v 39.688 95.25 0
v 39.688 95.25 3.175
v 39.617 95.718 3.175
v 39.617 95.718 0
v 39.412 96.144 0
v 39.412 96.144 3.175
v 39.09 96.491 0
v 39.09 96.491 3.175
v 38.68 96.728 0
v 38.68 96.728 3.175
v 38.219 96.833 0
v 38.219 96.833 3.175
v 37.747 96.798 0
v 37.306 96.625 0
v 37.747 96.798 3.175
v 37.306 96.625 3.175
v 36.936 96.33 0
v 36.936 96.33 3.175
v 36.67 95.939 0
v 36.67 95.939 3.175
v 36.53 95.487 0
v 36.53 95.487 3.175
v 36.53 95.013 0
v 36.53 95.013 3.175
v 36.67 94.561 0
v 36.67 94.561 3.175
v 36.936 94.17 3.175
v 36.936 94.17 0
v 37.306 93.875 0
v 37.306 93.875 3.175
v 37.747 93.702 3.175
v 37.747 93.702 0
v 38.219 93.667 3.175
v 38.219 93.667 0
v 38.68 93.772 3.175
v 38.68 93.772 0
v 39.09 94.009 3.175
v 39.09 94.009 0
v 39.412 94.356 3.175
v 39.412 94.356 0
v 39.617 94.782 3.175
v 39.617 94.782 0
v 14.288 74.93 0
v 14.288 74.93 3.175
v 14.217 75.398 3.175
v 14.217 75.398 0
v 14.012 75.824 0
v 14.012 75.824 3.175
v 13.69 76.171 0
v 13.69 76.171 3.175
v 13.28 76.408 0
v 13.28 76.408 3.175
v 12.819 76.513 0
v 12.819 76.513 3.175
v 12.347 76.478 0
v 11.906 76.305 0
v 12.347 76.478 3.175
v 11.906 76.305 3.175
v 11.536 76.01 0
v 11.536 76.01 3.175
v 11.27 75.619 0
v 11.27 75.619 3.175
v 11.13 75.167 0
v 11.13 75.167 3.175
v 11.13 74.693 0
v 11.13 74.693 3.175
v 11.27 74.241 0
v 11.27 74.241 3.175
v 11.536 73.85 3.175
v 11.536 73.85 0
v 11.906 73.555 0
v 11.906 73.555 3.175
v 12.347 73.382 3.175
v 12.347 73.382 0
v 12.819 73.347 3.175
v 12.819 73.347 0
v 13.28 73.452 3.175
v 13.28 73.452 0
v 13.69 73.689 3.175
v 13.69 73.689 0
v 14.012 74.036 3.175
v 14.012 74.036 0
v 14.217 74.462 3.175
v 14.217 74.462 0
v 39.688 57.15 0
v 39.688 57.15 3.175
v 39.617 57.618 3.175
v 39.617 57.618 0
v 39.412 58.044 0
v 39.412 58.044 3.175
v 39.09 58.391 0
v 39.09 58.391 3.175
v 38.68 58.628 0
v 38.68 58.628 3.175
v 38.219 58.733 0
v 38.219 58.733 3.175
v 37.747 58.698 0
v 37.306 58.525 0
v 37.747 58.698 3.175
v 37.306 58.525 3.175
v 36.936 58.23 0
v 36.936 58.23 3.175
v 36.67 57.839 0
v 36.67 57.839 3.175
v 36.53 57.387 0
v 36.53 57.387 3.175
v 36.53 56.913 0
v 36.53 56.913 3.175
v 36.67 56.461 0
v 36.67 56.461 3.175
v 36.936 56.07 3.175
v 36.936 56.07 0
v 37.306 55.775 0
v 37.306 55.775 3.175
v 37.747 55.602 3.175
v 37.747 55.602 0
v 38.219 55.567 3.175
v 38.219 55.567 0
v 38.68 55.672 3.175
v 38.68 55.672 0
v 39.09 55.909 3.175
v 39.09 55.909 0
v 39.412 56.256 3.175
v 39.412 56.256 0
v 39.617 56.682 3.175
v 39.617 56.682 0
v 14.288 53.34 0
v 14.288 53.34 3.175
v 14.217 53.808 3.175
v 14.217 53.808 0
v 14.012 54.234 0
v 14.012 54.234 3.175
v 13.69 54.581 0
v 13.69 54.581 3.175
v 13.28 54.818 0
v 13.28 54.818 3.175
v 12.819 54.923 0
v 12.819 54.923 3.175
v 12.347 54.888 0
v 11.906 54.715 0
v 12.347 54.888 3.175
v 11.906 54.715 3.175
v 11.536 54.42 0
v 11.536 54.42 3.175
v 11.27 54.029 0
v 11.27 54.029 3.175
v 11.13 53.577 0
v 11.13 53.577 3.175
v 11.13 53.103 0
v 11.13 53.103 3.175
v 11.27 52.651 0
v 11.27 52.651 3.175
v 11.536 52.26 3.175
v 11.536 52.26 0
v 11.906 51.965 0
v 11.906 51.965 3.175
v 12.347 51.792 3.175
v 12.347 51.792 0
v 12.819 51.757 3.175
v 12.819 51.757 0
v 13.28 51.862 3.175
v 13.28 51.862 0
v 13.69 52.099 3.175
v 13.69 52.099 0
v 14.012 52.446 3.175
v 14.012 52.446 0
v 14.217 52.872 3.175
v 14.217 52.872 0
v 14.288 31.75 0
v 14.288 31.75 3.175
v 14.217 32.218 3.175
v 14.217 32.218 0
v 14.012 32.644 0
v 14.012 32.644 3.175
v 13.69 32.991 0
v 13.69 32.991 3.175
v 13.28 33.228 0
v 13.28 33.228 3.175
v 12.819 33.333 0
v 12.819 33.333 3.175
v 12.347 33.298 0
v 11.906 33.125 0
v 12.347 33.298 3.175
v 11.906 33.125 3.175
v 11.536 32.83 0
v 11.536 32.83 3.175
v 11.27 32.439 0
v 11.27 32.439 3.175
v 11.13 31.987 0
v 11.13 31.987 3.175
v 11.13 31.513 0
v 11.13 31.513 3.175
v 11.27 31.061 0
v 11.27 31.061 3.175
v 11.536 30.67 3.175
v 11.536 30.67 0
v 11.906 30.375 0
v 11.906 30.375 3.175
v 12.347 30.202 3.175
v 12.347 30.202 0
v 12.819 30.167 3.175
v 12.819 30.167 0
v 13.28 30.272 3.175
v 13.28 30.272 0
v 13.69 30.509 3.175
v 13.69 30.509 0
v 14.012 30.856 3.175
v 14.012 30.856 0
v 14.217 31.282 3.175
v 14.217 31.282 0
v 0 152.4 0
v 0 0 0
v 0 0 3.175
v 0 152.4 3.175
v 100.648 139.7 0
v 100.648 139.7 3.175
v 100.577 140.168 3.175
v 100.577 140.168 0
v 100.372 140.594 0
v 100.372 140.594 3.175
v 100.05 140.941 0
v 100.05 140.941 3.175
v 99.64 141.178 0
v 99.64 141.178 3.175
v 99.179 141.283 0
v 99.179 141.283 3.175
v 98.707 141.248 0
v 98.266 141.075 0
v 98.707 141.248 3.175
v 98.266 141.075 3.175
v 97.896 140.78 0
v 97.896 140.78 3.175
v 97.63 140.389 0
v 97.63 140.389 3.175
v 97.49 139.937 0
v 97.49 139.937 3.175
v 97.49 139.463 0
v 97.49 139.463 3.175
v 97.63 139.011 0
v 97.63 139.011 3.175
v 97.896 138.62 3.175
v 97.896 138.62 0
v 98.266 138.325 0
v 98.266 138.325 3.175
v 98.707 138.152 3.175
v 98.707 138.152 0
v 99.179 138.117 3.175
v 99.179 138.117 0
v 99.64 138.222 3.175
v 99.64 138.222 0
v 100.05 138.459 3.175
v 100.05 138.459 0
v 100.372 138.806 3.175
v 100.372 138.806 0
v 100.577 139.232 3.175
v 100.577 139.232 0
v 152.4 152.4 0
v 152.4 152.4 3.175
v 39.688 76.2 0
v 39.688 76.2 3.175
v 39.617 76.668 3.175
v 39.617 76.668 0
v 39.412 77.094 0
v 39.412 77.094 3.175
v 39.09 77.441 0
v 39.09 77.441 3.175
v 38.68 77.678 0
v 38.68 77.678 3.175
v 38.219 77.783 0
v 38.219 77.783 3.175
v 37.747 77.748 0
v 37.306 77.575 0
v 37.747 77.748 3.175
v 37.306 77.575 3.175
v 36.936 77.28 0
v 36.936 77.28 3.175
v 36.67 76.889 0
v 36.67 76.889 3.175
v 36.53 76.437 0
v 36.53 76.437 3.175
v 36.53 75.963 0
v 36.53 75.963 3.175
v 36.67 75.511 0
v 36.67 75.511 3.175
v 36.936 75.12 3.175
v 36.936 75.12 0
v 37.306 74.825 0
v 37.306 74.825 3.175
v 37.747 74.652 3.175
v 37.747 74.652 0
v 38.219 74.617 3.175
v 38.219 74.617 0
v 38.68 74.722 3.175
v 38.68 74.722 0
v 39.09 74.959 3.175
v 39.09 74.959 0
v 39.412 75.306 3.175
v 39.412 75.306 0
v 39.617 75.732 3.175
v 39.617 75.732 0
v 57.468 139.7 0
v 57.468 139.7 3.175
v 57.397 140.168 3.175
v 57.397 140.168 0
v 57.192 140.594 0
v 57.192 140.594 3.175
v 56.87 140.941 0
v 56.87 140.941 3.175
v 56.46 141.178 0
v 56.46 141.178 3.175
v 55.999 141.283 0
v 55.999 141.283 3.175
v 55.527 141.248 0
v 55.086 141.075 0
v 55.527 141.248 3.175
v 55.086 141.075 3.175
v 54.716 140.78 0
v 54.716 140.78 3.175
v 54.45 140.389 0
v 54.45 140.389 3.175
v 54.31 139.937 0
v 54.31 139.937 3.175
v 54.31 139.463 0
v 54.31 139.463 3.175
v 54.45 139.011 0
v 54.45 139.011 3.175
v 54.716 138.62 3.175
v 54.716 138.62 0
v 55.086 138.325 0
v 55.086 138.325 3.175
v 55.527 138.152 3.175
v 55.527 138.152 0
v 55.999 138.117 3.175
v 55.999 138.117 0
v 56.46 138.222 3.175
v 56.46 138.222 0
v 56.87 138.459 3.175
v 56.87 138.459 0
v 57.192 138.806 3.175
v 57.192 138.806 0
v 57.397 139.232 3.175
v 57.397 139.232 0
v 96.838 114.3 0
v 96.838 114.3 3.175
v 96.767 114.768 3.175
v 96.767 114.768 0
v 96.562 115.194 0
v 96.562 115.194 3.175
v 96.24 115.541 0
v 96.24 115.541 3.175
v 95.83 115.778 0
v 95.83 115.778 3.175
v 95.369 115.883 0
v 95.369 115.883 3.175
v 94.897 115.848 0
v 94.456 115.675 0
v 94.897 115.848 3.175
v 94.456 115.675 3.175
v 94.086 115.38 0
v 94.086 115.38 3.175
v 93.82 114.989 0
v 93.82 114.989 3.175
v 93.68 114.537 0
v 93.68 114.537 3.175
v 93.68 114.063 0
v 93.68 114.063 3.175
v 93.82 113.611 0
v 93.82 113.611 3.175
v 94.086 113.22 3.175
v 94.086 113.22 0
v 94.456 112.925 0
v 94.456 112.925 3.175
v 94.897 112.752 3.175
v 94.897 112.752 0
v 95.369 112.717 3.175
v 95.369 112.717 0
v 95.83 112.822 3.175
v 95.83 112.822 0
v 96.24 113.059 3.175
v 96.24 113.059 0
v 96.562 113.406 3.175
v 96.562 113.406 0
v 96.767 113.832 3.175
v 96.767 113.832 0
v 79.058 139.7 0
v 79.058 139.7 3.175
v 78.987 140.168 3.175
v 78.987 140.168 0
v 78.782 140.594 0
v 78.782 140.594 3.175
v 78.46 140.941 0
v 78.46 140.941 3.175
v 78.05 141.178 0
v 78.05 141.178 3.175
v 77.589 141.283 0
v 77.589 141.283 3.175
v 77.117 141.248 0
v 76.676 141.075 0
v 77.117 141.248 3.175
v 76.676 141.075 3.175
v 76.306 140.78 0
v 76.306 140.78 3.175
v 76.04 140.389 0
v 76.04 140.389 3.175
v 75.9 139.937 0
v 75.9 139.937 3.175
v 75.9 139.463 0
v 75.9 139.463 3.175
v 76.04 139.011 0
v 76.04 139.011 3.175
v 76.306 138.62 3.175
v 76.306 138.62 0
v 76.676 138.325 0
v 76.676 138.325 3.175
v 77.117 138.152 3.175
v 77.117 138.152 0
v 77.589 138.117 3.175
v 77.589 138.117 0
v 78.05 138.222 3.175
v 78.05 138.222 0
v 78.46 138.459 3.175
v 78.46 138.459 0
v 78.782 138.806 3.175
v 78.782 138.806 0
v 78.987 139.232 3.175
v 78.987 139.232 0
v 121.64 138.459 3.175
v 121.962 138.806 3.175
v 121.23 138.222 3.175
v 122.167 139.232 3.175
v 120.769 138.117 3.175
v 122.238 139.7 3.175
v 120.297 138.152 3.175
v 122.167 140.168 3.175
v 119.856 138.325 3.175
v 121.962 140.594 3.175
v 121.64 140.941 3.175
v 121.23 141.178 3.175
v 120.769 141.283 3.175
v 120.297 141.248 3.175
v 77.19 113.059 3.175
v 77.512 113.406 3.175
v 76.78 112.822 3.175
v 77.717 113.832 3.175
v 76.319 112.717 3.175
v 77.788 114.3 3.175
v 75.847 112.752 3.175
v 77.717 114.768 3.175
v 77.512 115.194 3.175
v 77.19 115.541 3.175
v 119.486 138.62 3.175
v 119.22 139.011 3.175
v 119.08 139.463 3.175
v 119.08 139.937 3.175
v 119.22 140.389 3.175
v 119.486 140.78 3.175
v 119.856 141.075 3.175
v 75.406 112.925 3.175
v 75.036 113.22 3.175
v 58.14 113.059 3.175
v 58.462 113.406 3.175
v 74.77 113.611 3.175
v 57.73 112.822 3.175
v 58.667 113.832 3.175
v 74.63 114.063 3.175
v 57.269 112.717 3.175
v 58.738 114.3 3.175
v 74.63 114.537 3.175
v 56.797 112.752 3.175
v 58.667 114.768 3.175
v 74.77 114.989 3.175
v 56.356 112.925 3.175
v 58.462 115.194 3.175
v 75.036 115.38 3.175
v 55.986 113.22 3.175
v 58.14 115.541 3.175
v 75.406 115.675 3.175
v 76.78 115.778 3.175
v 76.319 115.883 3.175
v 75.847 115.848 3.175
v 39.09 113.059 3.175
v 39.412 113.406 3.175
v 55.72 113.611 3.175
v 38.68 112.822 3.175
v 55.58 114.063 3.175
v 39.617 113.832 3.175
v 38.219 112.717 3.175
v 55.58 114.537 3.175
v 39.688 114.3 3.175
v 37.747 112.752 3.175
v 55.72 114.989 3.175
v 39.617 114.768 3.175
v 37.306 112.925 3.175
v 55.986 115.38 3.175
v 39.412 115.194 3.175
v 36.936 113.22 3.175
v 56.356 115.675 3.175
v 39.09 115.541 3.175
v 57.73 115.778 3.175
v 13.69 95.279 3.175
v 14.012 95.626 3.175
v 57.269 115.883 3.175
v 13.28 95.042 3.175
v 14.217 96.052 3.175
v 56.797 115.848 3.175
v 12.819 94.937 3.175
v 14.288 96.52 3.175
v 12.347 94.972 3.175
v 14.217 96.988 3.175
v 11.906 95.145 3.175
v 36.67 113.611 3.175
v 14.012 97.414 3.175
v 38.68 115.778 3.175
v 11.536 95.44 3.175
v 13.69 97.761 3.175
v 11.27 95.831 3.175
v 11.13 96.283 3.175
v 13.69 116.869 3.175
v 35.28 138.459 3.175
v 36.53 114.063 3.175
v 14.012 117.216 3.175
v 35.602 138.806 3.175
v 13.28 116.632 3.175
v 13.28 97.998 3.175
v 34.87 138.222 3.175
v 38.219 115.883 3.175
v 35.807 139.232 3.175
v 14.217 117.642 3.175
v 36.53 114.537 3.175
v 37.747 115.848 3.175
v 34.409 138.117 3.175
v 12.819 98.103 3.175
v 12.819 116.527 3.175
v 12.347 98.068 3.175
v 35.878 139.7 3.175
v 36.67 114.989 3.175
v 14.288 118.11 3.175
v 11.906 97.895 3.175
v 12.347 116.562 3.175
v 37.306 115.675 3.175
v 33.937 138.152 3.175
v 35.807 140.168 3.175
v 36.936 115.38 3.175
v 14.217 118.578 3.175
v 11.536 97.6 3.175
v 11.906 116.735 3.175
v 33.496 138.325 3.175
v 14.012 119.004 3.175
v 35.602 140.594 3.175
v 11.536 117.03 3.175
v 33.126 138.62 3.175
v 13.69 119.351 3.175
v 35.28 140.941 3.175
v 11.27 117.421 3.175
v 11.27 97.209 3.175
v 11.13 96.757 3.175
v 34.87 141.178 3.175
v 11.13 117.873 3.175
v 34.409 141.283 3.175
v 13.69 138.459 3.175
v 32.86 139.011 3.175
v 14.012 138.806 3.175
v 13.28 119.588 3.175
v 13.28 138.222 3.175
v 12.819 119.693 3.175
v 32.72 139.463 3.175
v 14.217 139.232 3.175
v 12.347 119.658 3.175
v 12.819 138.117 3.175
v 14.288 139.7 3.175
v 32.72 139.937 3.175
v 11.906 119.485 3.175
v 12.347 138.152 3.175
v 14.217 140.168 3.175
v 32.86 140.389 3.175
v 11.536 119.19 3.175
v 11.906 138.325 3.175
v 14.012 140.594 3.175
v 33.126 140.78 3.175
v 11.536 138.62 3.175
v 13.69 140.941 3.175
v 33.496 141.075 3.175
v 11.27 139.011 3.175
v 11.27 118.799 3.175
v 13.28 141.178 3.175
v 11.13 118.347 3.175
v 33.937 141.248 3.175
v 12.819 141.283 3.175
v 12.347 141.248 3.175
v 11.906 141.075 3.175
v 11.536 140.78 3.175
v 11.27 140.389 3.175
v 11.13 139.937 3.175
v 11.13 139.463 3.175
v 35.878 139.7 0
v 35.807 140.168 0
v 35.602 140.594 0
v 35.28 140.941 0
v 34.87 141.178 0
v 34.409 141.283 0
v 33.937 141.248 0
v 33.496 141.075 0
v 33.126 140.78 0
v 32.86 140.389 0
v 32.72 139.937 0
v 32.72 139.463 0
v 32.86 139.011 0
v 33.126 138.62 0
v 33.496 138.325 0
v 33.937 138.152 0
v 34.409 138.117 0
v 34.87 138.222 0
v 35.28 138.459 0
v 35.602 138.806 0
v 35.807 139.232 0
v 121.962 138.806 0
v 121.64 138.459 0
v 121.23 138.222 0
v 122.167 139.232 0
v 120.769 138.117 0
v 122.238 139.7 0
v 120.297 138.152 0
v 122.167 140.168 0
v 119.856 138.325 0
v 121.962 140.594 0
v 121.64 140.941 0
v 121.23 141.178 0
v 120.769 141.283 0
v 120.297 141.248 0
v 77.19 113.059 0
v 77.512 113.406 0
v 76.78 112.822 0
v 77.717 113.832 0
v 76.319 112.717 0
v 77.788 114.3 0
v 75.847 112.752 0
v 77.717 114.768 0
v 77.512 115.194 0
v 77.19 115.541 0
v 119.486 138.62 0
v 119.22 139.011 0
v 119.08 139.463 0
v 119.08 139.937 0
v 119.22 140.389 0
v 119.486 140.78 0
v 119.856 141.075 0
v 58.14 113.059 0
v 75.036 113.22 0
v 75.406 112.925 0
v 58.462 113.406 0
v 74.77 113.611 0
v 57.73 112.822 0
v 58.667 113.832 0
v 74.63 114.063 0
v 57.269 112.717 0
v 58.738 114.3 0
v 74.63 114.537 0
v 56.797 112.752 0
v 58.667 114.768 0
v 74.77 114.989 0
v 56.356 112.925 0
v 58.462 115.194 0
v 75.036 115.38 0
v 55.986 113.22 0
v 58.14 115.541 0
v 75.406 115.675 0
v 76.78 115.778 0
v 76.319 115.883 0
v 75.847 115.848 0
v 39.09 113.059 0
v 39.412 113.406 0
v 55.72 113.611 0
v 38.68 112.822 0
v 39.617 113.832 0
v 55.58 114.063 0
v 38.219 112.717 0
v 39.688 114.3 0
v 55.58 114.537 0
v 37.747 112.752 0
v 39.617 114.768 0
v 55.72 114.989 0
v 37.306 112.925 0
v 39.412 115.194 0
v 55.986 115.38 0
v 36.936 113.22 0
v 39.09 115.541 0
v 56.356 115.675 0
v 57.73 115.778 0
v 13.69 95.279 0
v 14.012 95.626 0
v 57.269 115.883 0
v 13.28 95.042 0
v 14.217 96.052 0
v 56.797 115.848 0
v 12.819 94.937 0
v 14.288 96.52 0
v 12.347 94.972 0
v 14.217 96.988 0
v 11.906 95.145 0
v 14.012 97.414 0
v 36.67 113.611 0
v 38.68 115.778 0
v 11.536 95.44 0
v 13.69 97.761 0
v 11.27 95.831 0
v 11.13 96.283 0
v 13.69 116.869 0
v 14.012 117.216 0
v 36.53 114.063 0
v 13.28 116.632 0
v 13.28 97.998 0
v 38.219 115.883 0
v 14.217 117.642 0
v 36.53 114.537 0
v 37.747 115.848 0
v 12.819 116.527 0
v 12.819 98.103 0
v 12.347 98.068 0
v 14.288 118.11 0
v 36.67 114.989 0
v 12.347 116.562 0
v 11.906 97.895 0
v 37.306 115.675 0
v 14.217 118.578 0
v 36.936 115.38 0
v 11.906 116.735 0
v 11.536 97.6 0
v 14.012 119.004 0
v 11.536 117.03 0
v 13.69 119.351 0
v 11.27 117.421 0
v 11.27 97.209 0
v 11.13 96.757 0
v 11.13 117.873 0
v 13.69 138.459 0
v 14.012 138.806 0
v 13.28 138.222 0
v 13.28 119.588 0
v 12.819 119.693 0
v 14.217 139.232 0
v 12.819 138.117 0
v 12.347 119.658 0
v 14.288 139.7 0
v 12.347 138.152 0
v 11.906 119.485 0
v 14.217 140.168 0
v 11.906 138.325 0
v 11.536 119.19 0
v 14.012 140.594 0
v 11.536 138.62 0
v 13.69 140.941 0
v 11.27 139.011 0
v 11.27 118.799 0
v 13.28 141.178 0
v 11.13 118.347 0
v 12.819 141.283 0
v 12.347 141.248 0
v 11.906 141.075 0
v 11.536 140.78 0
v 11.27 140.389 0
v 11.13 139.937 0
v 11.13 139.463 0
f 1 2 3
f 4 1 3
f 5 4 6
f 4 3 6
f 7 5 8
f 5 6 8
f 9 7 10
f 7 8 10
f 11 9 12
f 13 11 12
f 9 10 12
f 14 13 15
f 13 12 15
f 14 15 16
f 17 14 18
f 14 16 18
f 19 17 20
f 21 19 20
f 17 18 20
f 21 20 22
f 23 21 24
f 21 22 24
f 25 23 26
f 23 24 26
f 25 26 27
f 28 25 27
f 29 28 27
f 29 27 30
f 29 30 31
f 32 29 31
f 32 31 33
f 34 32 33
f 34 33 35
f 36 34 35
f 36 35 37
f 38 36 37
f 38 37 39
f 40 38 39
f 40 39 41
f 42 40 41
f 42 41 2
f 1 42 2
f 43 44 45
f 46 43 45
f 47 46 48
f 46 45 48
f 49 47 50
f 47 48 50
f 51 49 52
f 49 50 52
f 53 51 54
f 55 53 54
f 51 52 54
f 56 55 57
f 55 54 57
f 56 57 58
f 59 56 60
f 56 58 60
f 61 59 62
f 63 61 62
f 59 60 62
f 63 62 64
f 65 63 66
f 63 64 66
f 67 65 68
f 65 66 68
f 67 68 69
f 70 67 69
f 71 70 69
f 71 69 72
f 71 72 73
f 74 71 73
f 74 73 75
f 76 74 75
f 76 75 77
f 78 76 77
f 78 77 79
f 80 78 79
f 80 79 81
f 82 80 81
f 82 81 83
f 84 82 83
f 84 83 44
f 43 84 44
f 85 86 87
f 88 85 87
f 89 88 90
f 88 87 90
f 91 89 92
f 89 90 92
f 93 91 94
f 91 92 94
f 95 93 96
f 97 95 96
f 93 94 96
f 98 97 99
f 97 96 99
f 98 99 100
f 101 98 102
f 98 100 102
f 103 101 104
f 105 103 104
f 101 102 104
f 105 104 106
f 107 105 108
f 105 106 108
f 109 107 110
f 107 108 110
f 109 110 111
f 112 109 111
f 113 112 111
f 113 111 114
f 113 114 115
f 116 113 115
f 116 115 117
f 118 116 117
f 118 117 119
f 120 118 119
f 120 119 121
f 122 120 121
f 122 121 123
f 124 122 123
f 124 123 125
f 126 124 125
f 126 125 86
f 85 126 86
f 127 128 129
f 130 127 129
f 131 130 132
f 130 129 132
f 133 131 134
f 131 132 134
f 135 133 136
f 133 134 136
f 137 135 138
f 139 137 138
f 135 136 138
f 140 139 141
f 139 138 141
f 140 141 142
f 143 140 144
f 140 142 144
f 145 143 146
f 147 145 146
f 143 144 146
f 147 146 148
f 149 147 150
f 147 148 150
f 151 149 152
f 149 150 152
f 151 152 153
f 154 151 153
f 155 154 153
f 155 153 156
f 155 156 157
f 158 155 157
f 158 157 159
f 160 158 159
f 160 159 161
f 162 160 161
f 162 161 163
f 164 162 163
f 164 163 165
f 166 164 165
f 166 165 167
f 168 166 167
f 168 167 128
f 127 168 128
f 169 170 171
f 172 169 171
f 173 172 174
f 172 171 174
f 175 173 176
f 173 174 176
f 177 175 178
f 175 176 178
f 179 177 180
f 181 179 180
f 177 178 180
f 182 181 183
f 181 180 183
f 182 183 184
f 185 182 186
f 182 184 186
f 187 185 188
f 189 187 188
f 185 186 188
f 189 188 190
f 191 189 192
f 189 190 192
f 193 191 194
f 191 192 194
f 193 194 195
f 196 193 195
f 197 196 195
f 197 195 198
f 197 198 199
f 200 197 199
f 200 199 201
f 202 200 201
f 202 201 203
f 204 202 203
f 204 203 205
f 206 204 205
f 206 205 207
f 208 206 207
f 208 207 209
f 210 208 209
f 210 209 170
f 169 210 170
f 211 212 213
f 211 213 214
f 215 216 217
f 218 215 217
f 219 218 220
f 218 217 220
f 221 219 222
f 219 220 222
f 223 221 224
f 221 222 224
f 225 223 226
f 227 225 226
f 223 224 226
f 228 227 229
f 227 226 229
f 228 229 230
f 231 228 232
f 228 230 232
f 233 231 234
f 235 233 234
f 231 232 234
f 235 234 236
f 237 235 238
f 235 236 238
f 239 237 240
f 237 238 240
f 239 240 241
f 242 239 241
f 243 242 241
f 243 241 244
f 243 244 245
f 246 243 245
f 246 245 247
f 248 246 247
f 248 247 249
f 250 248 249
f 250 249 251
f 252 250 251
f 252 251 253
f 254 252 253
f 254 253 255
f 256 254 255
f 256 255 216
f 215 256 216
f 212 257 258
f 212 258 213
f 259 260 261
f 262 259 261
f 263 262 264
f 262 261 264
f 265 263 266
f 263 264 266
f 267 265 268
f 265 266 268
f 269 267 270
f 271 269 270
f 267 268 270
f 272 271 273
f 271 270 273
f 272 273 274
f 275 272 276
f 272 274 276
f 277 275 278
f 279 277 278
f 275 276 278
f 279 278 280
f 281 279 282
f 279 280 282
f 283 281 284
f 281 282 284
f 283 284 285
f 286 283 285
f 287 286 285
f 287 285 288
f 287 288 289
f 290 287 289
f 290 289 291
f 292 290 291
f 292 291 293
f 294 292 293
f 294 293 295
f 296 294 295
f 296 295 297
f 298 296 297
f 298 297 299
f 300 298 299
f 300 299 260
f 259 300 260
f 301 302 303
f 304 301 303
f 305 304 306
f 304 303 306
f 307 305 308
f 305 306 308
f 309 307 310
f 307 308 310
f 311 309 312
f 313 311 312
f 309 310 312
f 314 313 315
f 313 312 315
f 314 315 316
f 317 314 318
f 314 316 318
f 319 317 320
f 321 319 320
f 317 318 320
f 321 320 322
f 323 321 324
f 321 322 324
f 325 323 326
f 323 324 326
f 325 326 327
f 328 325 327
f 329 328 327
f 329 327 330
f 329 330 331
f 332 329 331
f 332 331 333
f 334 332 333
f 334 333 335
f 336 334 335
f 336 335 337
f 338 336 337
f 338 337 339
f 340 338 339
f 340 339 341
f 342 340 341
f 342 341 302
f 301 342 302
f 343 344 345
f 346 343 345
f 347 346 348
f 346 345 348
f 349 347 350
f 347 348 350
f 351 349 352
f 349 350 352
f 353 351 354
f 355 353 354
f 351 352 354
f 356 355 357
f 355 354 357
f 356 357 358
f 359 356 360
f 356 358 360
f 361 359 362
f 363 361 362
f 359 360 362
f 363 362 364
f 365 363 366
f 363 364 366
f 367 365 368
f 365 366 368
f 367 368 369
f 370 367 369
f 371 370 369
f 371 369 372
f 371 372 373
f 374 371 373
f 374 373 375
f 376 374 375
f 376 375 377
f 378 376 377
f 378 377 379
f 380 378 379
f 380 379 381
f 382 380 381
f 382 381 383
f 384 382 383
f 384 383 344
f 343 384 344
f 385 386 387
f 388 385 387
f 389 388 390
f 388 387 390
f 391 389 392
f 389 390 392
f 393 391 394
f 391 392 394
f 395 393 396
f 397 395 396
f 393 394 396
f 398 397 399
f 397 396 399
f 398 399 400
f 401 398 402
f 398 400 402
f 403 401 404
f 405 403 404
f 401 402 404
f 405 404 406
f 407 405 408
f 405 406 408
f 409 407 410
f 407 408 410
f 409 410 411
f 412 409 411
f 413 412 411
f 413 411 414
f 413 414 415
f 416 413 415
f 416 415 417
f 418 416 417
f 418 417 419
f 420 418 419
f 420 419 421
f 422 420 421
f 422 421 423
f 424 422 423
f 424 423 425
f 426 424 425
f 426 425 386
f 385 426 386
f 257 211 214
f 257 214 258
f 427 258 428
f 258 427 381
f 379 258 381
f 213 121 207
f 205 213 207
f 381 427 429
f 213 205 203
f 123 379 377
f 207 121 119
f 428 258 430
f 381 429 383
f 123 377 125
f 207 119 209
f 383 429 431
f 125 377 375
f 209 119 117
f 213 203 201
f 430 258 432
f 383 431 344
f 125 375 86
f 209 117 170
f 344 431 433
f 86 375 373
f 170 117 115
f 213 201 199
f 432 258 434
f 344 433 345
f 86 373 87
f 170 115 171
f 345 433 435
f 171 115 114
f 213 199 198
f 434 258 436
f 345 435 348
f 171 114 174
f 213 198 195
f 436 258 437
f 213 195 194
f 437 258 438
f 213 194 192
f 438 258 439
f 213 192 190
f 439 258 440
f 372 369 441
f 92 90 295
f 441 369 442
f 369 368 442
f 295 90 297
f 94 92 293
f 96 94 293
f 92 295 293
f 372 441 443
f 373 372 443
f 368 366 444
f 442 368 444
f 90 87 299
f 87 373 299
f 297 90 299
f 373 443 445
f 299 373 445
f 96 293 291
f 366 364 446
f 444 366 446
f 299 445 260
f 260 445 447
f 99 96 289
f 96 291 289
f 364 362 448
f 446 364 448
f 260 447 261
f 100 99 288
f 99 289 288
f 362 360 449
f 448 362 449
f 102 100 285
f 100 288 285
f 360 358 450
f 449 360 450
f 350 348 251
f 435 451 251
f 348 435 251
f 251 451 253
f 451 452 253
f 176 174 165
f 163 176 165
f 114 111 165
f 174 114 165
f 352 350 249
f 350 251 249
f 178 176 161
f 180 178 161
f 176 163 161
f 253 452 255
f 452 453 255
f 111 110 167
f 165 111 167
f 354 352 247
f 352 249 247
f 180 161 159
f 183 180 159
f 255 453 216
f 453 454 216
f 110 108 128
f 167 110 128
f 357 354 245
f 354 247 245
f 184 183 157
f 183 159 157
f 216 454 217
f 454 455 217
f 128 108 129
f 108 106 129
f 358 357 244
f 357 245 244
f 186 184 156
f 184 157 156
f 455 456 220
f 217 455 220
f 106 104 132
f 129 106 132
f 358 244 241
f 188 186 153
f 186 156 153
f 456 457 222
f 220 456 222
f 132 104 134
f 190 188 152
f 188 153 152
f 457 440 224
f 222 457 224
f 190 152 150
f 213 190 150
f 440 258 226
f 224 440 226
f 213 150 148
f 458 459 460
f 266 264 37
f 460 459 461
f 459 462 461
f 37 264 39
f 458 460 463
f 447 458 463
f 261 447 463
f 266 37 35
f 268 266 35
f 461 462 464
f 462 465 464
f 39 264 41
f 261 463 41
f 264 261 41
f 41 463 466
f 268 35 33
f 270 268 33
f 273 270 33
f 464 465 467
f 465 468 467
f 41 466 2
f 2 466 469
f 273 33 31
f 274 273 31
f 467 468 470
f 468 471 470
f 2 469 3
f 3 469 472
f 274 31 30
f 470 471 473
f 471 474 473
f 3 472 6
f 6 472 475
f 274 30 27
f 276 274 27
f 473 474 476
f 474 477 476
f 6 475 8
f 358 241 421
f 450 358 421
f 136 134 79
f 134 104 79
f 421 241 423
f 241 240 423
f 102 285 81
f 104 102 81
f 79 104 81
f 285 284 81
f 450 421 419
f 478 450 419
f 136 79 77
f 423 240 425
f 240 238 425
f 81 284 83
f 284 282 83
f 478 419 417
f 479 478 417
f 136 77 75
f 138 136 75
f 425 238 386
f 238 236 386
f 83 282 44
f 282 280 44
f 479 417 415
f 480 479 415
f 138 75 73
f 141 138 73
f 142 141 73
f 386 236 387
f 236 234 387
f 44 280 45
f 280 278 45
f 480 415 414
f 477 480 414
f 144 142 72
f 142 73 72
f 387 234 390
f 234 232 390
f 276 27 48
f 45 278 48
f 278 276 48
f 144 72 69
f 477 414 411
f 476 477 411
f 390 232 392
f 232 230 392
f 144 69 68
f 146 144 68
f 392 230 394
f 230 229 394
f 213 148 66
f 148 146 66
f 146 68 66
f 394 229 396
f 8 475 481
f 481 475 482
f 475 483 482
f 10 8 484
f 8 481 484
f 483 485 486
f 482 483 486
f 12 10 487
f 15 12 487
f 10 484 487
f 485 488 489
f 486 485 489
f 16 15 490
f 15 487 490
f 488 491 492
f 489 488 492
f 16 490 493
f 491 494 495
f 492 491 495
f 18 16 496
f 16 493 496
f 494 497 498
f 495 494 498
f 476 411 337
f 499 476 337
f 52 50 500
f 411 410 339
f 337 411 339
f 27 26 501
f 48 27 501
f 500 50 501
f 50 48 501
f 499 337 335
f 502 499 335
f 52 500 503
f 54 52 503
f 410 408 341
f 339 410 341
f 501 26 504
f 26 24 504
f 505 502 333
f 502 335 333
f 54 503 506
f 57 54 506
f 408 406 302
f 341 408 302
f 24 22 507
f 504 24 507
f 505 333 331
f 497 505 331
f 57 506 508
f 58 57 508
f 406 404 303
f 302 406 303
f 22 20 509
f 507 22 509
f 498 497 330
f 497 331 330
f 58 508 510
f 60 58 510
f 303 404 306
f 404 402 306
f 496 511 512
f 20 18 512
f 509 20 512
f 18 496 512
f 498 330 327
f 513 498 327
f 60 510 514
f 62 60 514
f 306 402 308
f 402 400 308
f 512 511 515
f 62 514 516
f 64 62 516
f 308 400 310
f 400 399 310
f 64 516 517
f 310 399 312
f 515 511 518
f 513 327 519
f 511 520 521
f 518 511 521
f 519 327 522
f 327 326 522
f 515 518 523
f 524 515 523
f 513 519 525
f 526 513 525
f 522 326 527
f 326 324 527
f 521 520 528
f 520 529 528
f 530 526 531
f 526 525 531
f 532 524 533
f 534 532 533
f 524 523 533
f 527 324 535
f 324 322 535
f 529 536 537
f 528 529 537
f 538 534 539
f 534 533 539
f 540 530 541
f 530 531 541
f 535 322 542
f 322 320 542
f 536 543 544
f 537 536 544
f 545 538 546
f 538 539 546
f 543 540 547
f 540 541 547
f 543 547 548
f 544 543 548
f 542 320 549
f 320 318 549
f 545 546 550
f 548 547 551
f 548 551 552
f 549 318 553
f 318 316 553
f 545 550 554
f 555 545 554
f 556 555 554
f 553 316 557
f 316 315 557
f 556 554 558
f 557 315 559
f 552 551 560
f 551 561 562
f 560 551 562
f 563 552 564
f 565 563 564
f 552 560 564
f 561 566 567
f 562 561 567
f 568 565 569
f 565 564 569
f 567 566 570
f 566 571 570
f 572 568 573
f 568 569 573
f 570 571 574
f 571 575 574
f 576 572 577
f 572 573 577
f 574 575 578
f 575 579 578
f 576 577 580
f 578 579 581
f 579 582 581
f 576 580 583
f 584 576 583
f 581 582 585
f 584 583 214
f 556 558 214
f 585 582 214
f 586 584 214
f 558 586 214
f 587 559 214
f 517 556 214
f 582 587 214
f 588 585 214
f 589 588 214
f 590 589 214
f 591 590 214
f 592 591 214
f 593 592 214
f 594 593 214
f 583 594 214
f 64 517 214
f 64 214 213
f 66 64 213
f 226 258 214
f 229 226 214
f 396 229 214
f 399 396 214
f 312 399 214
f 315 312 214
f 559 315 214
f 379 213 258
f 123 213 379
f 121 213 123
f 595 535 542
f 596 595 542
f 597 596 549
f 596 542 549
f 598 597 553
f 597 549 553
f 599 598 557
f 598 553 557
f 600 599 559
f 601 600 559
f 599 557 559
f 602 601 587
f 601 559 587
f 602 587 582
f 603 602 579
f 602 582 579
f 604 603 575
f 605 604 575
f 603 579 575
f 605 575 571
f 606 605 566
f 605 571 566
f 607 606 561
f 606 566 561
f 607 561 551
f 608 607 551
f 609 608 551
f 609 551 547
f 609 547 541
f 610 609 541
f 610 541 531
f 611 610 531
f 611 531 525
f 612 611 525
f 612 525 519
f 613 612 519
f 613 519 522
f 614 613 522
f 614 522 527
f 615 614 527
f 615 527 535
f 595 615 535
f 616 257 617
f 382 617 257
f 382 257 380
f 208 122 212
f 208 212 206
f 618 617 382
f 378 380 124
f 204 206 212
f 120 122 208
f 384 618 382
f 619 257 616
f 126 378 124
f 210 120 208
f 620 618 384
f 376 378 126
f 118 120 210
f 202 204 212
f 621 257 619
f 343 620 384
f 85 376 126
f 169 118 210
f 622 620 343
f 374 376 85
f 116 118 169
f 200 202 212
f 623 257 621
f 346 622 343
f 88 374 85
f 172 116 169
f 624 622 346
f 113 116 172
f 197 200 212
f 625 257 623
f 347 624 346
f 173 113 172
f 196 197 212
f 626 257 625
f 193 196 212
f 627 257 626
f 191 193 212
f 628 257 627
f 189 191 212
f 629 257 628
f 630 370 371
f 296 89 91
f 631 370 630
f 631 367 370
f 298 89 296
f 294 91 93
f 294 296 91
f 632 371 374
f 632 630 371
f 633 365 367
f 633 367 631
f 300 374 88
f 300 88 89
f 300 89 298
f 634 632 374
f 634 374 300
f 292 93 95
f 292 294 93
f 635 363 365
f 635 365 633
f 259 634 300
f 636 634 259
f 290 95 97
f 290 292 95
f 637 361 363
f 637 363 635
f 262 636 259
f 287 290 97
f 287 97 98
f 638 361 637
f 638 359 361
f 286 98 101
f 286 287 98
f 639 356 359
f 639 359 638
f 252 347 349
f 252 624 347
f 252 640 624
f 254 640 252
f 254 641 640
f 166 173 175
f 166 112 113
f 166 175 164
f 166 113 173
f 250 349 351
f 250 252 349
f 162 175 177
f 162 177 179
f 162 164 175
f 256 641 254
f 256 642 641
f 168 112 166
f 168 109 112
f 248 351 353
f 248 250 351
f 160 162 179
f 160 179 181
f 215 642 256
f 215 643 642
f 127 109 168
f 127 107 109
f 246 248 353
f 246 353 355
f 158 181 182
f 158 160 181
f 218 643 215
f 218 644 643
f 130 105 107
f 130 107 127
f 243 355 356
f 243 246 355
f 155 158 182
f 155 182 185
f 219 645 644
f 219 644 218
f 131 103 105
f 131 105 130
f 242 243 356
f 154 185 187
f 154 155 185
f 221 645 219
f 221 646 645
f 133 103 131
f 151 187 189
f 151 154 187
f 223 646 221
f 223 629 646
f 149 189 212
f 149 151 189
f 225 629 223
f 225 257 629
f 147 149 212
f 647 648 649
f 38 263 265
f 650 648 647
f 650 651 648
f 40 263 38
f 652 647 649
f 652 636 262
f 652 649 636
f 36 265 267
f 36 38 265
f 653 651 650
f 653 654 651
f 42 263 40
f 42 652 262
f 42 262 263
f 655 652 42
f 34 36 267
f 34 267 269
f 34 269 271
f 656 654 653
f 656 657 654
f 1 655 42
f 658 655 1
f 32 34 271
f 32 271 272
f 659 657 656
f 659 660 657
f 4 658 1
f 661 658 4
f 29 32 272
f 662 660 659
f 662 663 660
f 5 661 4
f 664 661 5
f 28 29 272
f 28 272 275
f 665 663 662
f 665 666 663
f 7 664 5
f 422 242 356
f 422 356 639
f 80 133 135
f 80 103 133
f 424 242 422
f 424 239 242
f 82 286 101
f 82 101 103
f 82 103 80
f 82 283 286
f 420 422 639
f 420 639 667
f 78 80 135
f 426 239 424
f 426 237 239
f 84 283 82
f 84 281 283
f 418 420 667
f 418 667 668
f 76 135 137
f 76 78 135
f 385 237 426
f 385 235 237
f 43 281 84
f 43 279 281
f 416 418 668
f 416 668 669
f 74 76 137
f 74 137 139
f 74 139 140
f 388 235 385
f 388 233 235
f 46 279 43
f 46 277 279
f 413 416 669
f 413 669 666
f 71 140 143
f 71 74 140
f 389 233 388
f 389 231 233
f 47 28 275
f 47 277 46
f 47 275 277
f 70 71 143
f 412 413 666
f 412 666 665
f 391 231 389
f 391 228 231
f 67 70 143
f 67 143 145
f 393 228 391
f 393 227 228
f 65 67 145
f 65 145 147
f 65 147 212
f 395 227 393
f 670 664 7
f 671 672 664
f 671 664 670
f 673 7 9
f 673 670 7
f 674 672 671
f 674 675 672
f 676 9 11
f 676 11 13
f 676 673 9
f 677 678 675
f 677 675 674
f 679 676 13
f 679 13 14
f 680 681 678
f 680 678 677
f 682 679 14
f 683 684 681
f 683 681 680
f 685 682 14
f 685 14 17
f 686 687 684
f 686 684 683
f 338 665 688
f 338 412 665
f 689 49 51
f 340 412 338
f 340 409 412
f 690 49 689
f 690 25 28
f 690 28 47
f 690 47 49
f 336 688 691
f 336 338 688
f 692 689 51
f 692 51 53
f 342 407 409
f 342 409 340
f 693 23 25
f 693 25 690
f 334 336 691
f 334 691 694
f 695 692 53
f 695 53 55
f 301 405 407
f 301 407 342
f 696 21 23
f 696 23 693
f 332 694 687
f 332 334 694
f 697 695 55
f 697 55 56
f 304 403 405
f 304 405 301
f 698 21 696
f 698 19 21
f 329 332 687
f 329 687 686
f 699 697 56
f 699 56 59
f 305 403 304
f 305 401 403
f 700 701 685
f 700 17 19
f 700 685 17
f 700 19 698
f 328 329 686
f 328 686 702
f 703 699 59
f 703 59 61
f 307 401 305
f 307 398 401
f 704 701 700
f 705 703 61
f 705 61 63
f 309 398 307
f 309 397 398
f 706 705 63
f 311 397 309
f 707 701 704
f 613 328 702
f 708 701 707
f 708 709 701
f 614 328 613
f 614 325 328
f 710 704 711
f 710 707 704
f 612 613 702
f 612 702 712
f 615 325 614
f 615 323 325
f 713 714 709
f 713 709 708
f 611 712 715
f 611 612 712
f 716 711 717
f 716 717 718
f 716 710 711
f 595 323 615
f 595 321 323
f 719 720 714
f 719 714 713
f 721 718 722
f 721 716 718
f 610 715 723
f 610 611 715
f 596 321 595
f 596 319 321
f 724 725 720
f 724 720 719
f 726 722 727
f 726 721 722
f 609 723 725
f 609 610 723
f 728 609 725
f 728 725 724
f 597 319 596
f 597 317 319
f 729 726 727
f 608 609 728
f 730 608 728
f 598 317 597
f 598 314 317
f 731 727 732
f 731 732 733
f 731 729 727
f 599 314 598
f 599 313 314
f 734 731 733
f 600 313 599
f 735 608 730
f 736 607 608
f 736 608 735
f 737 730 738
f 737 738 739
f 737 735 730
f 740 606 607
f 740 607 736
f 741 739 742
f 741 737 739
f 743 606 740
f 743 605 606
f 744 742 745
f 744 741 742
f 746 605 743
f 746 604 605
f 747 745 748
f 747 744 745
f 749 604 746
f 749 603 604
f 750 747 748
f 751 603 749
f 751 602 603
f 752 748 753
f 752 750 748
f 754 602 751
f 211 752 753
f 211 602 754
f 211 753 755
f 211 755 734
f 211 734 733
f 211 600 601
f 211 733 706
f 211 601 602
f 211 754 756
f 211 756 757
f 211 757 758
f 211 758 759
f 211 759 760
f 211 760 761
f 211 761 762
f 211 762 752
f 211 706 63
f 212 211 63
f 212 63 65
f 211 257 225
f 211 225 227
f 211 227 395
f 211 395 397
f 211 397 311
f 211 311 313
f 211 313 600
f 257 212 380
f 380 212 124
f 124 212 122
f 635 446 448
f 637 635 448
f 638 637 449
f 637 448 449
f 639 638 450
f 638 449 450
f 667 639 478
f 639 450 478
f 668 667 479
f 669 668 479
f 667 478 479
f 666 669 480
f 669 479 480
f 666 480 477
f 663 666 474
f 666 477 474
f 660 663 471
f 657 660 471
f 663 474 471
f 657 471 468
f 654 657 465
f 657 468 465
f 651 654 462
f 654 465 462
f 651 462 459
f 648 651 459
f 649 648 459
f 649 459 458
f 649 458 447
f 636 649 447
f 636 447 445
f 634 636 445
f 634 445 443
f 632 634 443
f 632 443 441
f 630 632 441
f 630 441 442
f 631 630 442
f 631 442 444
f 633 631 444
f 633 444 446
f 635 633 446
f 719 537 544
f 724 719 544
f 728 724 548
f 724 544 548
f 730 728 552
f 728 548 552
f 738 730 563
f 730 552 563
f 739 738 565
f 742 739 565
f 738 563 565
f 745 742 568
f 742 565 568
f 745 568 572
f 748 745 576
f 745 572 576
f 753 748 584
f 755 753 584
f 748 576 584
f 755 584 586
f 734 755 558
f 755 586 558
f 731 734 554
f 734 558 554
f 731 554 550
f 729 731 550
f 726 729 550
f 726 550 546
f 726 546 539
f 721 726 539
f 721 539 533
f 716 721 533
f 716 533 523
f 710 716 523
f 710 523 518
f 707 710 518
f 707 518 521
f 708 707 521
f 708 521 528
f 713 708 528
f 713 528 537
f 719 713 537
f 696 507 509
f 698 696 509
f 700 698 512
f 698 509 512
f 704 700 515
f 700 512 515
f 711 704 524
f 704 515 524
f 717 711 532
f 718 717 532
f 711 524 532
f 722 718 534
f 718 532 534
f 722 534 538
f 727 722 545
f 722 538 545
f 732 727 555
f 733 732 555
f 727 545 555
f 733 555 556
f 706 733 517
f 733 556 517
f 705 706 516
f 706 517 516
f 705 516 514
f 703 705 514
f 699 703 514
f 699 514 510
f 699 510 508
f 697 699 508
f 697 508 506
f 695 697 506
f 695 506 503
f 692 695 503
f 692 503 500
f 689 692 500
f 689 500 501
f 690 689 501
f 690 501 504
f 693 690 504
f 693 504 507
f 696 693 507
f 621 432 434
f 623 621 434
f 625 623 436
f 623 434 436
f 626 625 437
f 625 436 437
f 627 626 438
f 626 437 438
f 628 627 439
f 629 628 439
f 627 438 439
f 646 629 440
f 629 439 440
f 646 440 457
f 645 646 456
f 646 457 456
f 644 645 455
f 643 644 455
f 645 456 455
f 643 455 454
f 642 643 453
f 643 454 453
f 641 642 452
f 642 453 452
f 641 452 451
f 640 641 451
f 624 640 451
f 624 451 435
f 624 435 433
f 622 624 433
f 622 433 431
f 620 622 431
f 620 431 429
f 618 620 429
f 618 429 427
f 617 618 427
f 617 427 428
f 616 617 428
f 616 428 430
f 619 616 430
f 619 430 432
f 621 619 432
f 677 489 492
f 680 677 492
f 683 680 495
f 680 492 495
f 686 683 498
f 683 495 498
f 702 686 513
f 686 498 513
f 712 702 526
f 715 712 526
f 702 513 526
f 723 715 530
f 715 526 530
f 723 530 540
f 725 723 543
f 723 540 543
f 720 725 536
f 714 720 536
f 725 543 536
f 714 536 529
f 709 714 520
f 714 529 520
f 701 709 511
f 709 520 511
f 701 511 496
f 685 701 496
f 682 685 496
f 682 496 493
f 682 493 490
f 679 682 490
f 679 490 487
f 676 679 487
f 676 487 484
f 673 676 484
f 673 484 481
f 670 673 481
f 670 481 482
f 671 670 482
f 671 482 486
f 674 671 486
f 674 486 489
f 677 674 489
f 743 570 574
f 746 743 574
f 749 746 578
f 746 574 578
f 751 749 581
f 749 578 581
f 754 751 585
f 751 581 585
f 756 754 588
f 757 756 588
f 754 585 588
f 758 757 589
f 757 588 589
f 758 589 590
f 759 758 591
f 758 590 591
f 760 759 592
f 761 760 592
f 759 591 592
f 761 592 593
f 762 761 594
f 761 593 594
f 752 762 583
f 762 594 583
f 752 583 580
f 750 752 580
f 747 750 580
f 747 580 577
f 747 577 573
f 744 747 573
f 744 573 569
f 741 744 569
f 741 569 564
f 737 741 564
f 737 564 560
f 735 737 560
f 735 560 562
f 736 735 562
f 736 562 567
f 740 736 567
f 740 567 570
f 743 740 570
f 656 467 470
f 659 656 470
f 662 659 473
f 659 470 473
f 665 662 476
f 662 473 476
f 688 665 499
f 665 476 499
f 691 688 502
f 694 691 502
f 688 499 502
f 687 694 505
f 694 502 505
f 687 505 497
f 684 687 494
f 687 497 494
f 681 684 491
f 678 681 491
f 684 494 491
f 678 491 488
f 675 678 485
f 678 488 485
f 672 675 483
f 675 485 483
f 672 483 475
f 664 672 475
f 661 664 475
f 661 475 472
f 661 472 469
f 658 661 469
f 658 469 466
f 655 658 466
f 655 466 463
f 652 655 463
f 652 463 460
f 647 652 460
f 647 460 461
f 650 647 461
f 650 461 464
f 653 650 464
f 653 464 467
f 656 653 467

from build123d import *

# Parameters (mm, degrees)
BOSS_EXTRUDE1_DEPTH = 3.175
SKETCH2_R           = 1.5875
CUT_EXTRUDE_R_DEPTH = 216.549531721


with BuildPart() as part:
    # Sketch1 → Boss-Extrude1 (new body)
    with BuildSketch(Plane.XY):
        Polygon((0, 0), (0, 152.4), (152.4, 152.4), align=None)
    extrude(amount=BOSS_EXTRUDE1_DEPTH)

    # Sketch2 → Cut-Extrude r (cut, through all)
    with BuildSketch(Plane.XY.offset(3.175)):
        with Locations((12.7, 139.7)):
            Circle(SKETCH2_R)
        with Locations((34.29, 139.7)):
            Circle(SKETCH2_R)
        with Locations((55.88, 139.7)):
            Circle(SKETCH2_R)
        with Locations((77.47, 139.7)):
            Circle(SKETCH2_R)
        with Locations((12.7, 118.11)):
            Circle(SKETCH2_R)
        with Locations((12.7, 96.52)):
            Circle(SKETCH2_R)
        with Locations((12.7, 74.93)):
            Circle(SKETCH2_R)
        with Locations((38.1, 114.3)):
            Circle(SKETCH2_R)
        with Locations((57.15, 114.3)):
            Circle(SKETCH2_R)
        with Locations((38.1, 95.25)):
            Circle(SKETCH2_R)
        with Locations((99.06, 139.7)):
            Circle(SKETCH2_R)
        with Locations((120.65, 139.7)):
            Circle(SKETCH2_R)
        with Locations((12.7, 53.34)):
            Circle(SKETCH2_R)
        with Locations((12.7, 31.75)):
            Circle(SKETCH2_R)
        with Locations((76.2, 114.3)):
            Circle(SKETCH2_R)
        with Locations((95.25, 114.3)):
            Circle(SKETCH2_R)
        with Locations((38.1, 76.2)):
            Circle(SKETCH2_R)
        with Locations((38.1, 57.15)):
            Circle(SKETCH2_R)
    extrude(amount=-CUT_EXTRUDE_R_DEPTH, mode=Mode.SUBTRACT)


solid = part.part
